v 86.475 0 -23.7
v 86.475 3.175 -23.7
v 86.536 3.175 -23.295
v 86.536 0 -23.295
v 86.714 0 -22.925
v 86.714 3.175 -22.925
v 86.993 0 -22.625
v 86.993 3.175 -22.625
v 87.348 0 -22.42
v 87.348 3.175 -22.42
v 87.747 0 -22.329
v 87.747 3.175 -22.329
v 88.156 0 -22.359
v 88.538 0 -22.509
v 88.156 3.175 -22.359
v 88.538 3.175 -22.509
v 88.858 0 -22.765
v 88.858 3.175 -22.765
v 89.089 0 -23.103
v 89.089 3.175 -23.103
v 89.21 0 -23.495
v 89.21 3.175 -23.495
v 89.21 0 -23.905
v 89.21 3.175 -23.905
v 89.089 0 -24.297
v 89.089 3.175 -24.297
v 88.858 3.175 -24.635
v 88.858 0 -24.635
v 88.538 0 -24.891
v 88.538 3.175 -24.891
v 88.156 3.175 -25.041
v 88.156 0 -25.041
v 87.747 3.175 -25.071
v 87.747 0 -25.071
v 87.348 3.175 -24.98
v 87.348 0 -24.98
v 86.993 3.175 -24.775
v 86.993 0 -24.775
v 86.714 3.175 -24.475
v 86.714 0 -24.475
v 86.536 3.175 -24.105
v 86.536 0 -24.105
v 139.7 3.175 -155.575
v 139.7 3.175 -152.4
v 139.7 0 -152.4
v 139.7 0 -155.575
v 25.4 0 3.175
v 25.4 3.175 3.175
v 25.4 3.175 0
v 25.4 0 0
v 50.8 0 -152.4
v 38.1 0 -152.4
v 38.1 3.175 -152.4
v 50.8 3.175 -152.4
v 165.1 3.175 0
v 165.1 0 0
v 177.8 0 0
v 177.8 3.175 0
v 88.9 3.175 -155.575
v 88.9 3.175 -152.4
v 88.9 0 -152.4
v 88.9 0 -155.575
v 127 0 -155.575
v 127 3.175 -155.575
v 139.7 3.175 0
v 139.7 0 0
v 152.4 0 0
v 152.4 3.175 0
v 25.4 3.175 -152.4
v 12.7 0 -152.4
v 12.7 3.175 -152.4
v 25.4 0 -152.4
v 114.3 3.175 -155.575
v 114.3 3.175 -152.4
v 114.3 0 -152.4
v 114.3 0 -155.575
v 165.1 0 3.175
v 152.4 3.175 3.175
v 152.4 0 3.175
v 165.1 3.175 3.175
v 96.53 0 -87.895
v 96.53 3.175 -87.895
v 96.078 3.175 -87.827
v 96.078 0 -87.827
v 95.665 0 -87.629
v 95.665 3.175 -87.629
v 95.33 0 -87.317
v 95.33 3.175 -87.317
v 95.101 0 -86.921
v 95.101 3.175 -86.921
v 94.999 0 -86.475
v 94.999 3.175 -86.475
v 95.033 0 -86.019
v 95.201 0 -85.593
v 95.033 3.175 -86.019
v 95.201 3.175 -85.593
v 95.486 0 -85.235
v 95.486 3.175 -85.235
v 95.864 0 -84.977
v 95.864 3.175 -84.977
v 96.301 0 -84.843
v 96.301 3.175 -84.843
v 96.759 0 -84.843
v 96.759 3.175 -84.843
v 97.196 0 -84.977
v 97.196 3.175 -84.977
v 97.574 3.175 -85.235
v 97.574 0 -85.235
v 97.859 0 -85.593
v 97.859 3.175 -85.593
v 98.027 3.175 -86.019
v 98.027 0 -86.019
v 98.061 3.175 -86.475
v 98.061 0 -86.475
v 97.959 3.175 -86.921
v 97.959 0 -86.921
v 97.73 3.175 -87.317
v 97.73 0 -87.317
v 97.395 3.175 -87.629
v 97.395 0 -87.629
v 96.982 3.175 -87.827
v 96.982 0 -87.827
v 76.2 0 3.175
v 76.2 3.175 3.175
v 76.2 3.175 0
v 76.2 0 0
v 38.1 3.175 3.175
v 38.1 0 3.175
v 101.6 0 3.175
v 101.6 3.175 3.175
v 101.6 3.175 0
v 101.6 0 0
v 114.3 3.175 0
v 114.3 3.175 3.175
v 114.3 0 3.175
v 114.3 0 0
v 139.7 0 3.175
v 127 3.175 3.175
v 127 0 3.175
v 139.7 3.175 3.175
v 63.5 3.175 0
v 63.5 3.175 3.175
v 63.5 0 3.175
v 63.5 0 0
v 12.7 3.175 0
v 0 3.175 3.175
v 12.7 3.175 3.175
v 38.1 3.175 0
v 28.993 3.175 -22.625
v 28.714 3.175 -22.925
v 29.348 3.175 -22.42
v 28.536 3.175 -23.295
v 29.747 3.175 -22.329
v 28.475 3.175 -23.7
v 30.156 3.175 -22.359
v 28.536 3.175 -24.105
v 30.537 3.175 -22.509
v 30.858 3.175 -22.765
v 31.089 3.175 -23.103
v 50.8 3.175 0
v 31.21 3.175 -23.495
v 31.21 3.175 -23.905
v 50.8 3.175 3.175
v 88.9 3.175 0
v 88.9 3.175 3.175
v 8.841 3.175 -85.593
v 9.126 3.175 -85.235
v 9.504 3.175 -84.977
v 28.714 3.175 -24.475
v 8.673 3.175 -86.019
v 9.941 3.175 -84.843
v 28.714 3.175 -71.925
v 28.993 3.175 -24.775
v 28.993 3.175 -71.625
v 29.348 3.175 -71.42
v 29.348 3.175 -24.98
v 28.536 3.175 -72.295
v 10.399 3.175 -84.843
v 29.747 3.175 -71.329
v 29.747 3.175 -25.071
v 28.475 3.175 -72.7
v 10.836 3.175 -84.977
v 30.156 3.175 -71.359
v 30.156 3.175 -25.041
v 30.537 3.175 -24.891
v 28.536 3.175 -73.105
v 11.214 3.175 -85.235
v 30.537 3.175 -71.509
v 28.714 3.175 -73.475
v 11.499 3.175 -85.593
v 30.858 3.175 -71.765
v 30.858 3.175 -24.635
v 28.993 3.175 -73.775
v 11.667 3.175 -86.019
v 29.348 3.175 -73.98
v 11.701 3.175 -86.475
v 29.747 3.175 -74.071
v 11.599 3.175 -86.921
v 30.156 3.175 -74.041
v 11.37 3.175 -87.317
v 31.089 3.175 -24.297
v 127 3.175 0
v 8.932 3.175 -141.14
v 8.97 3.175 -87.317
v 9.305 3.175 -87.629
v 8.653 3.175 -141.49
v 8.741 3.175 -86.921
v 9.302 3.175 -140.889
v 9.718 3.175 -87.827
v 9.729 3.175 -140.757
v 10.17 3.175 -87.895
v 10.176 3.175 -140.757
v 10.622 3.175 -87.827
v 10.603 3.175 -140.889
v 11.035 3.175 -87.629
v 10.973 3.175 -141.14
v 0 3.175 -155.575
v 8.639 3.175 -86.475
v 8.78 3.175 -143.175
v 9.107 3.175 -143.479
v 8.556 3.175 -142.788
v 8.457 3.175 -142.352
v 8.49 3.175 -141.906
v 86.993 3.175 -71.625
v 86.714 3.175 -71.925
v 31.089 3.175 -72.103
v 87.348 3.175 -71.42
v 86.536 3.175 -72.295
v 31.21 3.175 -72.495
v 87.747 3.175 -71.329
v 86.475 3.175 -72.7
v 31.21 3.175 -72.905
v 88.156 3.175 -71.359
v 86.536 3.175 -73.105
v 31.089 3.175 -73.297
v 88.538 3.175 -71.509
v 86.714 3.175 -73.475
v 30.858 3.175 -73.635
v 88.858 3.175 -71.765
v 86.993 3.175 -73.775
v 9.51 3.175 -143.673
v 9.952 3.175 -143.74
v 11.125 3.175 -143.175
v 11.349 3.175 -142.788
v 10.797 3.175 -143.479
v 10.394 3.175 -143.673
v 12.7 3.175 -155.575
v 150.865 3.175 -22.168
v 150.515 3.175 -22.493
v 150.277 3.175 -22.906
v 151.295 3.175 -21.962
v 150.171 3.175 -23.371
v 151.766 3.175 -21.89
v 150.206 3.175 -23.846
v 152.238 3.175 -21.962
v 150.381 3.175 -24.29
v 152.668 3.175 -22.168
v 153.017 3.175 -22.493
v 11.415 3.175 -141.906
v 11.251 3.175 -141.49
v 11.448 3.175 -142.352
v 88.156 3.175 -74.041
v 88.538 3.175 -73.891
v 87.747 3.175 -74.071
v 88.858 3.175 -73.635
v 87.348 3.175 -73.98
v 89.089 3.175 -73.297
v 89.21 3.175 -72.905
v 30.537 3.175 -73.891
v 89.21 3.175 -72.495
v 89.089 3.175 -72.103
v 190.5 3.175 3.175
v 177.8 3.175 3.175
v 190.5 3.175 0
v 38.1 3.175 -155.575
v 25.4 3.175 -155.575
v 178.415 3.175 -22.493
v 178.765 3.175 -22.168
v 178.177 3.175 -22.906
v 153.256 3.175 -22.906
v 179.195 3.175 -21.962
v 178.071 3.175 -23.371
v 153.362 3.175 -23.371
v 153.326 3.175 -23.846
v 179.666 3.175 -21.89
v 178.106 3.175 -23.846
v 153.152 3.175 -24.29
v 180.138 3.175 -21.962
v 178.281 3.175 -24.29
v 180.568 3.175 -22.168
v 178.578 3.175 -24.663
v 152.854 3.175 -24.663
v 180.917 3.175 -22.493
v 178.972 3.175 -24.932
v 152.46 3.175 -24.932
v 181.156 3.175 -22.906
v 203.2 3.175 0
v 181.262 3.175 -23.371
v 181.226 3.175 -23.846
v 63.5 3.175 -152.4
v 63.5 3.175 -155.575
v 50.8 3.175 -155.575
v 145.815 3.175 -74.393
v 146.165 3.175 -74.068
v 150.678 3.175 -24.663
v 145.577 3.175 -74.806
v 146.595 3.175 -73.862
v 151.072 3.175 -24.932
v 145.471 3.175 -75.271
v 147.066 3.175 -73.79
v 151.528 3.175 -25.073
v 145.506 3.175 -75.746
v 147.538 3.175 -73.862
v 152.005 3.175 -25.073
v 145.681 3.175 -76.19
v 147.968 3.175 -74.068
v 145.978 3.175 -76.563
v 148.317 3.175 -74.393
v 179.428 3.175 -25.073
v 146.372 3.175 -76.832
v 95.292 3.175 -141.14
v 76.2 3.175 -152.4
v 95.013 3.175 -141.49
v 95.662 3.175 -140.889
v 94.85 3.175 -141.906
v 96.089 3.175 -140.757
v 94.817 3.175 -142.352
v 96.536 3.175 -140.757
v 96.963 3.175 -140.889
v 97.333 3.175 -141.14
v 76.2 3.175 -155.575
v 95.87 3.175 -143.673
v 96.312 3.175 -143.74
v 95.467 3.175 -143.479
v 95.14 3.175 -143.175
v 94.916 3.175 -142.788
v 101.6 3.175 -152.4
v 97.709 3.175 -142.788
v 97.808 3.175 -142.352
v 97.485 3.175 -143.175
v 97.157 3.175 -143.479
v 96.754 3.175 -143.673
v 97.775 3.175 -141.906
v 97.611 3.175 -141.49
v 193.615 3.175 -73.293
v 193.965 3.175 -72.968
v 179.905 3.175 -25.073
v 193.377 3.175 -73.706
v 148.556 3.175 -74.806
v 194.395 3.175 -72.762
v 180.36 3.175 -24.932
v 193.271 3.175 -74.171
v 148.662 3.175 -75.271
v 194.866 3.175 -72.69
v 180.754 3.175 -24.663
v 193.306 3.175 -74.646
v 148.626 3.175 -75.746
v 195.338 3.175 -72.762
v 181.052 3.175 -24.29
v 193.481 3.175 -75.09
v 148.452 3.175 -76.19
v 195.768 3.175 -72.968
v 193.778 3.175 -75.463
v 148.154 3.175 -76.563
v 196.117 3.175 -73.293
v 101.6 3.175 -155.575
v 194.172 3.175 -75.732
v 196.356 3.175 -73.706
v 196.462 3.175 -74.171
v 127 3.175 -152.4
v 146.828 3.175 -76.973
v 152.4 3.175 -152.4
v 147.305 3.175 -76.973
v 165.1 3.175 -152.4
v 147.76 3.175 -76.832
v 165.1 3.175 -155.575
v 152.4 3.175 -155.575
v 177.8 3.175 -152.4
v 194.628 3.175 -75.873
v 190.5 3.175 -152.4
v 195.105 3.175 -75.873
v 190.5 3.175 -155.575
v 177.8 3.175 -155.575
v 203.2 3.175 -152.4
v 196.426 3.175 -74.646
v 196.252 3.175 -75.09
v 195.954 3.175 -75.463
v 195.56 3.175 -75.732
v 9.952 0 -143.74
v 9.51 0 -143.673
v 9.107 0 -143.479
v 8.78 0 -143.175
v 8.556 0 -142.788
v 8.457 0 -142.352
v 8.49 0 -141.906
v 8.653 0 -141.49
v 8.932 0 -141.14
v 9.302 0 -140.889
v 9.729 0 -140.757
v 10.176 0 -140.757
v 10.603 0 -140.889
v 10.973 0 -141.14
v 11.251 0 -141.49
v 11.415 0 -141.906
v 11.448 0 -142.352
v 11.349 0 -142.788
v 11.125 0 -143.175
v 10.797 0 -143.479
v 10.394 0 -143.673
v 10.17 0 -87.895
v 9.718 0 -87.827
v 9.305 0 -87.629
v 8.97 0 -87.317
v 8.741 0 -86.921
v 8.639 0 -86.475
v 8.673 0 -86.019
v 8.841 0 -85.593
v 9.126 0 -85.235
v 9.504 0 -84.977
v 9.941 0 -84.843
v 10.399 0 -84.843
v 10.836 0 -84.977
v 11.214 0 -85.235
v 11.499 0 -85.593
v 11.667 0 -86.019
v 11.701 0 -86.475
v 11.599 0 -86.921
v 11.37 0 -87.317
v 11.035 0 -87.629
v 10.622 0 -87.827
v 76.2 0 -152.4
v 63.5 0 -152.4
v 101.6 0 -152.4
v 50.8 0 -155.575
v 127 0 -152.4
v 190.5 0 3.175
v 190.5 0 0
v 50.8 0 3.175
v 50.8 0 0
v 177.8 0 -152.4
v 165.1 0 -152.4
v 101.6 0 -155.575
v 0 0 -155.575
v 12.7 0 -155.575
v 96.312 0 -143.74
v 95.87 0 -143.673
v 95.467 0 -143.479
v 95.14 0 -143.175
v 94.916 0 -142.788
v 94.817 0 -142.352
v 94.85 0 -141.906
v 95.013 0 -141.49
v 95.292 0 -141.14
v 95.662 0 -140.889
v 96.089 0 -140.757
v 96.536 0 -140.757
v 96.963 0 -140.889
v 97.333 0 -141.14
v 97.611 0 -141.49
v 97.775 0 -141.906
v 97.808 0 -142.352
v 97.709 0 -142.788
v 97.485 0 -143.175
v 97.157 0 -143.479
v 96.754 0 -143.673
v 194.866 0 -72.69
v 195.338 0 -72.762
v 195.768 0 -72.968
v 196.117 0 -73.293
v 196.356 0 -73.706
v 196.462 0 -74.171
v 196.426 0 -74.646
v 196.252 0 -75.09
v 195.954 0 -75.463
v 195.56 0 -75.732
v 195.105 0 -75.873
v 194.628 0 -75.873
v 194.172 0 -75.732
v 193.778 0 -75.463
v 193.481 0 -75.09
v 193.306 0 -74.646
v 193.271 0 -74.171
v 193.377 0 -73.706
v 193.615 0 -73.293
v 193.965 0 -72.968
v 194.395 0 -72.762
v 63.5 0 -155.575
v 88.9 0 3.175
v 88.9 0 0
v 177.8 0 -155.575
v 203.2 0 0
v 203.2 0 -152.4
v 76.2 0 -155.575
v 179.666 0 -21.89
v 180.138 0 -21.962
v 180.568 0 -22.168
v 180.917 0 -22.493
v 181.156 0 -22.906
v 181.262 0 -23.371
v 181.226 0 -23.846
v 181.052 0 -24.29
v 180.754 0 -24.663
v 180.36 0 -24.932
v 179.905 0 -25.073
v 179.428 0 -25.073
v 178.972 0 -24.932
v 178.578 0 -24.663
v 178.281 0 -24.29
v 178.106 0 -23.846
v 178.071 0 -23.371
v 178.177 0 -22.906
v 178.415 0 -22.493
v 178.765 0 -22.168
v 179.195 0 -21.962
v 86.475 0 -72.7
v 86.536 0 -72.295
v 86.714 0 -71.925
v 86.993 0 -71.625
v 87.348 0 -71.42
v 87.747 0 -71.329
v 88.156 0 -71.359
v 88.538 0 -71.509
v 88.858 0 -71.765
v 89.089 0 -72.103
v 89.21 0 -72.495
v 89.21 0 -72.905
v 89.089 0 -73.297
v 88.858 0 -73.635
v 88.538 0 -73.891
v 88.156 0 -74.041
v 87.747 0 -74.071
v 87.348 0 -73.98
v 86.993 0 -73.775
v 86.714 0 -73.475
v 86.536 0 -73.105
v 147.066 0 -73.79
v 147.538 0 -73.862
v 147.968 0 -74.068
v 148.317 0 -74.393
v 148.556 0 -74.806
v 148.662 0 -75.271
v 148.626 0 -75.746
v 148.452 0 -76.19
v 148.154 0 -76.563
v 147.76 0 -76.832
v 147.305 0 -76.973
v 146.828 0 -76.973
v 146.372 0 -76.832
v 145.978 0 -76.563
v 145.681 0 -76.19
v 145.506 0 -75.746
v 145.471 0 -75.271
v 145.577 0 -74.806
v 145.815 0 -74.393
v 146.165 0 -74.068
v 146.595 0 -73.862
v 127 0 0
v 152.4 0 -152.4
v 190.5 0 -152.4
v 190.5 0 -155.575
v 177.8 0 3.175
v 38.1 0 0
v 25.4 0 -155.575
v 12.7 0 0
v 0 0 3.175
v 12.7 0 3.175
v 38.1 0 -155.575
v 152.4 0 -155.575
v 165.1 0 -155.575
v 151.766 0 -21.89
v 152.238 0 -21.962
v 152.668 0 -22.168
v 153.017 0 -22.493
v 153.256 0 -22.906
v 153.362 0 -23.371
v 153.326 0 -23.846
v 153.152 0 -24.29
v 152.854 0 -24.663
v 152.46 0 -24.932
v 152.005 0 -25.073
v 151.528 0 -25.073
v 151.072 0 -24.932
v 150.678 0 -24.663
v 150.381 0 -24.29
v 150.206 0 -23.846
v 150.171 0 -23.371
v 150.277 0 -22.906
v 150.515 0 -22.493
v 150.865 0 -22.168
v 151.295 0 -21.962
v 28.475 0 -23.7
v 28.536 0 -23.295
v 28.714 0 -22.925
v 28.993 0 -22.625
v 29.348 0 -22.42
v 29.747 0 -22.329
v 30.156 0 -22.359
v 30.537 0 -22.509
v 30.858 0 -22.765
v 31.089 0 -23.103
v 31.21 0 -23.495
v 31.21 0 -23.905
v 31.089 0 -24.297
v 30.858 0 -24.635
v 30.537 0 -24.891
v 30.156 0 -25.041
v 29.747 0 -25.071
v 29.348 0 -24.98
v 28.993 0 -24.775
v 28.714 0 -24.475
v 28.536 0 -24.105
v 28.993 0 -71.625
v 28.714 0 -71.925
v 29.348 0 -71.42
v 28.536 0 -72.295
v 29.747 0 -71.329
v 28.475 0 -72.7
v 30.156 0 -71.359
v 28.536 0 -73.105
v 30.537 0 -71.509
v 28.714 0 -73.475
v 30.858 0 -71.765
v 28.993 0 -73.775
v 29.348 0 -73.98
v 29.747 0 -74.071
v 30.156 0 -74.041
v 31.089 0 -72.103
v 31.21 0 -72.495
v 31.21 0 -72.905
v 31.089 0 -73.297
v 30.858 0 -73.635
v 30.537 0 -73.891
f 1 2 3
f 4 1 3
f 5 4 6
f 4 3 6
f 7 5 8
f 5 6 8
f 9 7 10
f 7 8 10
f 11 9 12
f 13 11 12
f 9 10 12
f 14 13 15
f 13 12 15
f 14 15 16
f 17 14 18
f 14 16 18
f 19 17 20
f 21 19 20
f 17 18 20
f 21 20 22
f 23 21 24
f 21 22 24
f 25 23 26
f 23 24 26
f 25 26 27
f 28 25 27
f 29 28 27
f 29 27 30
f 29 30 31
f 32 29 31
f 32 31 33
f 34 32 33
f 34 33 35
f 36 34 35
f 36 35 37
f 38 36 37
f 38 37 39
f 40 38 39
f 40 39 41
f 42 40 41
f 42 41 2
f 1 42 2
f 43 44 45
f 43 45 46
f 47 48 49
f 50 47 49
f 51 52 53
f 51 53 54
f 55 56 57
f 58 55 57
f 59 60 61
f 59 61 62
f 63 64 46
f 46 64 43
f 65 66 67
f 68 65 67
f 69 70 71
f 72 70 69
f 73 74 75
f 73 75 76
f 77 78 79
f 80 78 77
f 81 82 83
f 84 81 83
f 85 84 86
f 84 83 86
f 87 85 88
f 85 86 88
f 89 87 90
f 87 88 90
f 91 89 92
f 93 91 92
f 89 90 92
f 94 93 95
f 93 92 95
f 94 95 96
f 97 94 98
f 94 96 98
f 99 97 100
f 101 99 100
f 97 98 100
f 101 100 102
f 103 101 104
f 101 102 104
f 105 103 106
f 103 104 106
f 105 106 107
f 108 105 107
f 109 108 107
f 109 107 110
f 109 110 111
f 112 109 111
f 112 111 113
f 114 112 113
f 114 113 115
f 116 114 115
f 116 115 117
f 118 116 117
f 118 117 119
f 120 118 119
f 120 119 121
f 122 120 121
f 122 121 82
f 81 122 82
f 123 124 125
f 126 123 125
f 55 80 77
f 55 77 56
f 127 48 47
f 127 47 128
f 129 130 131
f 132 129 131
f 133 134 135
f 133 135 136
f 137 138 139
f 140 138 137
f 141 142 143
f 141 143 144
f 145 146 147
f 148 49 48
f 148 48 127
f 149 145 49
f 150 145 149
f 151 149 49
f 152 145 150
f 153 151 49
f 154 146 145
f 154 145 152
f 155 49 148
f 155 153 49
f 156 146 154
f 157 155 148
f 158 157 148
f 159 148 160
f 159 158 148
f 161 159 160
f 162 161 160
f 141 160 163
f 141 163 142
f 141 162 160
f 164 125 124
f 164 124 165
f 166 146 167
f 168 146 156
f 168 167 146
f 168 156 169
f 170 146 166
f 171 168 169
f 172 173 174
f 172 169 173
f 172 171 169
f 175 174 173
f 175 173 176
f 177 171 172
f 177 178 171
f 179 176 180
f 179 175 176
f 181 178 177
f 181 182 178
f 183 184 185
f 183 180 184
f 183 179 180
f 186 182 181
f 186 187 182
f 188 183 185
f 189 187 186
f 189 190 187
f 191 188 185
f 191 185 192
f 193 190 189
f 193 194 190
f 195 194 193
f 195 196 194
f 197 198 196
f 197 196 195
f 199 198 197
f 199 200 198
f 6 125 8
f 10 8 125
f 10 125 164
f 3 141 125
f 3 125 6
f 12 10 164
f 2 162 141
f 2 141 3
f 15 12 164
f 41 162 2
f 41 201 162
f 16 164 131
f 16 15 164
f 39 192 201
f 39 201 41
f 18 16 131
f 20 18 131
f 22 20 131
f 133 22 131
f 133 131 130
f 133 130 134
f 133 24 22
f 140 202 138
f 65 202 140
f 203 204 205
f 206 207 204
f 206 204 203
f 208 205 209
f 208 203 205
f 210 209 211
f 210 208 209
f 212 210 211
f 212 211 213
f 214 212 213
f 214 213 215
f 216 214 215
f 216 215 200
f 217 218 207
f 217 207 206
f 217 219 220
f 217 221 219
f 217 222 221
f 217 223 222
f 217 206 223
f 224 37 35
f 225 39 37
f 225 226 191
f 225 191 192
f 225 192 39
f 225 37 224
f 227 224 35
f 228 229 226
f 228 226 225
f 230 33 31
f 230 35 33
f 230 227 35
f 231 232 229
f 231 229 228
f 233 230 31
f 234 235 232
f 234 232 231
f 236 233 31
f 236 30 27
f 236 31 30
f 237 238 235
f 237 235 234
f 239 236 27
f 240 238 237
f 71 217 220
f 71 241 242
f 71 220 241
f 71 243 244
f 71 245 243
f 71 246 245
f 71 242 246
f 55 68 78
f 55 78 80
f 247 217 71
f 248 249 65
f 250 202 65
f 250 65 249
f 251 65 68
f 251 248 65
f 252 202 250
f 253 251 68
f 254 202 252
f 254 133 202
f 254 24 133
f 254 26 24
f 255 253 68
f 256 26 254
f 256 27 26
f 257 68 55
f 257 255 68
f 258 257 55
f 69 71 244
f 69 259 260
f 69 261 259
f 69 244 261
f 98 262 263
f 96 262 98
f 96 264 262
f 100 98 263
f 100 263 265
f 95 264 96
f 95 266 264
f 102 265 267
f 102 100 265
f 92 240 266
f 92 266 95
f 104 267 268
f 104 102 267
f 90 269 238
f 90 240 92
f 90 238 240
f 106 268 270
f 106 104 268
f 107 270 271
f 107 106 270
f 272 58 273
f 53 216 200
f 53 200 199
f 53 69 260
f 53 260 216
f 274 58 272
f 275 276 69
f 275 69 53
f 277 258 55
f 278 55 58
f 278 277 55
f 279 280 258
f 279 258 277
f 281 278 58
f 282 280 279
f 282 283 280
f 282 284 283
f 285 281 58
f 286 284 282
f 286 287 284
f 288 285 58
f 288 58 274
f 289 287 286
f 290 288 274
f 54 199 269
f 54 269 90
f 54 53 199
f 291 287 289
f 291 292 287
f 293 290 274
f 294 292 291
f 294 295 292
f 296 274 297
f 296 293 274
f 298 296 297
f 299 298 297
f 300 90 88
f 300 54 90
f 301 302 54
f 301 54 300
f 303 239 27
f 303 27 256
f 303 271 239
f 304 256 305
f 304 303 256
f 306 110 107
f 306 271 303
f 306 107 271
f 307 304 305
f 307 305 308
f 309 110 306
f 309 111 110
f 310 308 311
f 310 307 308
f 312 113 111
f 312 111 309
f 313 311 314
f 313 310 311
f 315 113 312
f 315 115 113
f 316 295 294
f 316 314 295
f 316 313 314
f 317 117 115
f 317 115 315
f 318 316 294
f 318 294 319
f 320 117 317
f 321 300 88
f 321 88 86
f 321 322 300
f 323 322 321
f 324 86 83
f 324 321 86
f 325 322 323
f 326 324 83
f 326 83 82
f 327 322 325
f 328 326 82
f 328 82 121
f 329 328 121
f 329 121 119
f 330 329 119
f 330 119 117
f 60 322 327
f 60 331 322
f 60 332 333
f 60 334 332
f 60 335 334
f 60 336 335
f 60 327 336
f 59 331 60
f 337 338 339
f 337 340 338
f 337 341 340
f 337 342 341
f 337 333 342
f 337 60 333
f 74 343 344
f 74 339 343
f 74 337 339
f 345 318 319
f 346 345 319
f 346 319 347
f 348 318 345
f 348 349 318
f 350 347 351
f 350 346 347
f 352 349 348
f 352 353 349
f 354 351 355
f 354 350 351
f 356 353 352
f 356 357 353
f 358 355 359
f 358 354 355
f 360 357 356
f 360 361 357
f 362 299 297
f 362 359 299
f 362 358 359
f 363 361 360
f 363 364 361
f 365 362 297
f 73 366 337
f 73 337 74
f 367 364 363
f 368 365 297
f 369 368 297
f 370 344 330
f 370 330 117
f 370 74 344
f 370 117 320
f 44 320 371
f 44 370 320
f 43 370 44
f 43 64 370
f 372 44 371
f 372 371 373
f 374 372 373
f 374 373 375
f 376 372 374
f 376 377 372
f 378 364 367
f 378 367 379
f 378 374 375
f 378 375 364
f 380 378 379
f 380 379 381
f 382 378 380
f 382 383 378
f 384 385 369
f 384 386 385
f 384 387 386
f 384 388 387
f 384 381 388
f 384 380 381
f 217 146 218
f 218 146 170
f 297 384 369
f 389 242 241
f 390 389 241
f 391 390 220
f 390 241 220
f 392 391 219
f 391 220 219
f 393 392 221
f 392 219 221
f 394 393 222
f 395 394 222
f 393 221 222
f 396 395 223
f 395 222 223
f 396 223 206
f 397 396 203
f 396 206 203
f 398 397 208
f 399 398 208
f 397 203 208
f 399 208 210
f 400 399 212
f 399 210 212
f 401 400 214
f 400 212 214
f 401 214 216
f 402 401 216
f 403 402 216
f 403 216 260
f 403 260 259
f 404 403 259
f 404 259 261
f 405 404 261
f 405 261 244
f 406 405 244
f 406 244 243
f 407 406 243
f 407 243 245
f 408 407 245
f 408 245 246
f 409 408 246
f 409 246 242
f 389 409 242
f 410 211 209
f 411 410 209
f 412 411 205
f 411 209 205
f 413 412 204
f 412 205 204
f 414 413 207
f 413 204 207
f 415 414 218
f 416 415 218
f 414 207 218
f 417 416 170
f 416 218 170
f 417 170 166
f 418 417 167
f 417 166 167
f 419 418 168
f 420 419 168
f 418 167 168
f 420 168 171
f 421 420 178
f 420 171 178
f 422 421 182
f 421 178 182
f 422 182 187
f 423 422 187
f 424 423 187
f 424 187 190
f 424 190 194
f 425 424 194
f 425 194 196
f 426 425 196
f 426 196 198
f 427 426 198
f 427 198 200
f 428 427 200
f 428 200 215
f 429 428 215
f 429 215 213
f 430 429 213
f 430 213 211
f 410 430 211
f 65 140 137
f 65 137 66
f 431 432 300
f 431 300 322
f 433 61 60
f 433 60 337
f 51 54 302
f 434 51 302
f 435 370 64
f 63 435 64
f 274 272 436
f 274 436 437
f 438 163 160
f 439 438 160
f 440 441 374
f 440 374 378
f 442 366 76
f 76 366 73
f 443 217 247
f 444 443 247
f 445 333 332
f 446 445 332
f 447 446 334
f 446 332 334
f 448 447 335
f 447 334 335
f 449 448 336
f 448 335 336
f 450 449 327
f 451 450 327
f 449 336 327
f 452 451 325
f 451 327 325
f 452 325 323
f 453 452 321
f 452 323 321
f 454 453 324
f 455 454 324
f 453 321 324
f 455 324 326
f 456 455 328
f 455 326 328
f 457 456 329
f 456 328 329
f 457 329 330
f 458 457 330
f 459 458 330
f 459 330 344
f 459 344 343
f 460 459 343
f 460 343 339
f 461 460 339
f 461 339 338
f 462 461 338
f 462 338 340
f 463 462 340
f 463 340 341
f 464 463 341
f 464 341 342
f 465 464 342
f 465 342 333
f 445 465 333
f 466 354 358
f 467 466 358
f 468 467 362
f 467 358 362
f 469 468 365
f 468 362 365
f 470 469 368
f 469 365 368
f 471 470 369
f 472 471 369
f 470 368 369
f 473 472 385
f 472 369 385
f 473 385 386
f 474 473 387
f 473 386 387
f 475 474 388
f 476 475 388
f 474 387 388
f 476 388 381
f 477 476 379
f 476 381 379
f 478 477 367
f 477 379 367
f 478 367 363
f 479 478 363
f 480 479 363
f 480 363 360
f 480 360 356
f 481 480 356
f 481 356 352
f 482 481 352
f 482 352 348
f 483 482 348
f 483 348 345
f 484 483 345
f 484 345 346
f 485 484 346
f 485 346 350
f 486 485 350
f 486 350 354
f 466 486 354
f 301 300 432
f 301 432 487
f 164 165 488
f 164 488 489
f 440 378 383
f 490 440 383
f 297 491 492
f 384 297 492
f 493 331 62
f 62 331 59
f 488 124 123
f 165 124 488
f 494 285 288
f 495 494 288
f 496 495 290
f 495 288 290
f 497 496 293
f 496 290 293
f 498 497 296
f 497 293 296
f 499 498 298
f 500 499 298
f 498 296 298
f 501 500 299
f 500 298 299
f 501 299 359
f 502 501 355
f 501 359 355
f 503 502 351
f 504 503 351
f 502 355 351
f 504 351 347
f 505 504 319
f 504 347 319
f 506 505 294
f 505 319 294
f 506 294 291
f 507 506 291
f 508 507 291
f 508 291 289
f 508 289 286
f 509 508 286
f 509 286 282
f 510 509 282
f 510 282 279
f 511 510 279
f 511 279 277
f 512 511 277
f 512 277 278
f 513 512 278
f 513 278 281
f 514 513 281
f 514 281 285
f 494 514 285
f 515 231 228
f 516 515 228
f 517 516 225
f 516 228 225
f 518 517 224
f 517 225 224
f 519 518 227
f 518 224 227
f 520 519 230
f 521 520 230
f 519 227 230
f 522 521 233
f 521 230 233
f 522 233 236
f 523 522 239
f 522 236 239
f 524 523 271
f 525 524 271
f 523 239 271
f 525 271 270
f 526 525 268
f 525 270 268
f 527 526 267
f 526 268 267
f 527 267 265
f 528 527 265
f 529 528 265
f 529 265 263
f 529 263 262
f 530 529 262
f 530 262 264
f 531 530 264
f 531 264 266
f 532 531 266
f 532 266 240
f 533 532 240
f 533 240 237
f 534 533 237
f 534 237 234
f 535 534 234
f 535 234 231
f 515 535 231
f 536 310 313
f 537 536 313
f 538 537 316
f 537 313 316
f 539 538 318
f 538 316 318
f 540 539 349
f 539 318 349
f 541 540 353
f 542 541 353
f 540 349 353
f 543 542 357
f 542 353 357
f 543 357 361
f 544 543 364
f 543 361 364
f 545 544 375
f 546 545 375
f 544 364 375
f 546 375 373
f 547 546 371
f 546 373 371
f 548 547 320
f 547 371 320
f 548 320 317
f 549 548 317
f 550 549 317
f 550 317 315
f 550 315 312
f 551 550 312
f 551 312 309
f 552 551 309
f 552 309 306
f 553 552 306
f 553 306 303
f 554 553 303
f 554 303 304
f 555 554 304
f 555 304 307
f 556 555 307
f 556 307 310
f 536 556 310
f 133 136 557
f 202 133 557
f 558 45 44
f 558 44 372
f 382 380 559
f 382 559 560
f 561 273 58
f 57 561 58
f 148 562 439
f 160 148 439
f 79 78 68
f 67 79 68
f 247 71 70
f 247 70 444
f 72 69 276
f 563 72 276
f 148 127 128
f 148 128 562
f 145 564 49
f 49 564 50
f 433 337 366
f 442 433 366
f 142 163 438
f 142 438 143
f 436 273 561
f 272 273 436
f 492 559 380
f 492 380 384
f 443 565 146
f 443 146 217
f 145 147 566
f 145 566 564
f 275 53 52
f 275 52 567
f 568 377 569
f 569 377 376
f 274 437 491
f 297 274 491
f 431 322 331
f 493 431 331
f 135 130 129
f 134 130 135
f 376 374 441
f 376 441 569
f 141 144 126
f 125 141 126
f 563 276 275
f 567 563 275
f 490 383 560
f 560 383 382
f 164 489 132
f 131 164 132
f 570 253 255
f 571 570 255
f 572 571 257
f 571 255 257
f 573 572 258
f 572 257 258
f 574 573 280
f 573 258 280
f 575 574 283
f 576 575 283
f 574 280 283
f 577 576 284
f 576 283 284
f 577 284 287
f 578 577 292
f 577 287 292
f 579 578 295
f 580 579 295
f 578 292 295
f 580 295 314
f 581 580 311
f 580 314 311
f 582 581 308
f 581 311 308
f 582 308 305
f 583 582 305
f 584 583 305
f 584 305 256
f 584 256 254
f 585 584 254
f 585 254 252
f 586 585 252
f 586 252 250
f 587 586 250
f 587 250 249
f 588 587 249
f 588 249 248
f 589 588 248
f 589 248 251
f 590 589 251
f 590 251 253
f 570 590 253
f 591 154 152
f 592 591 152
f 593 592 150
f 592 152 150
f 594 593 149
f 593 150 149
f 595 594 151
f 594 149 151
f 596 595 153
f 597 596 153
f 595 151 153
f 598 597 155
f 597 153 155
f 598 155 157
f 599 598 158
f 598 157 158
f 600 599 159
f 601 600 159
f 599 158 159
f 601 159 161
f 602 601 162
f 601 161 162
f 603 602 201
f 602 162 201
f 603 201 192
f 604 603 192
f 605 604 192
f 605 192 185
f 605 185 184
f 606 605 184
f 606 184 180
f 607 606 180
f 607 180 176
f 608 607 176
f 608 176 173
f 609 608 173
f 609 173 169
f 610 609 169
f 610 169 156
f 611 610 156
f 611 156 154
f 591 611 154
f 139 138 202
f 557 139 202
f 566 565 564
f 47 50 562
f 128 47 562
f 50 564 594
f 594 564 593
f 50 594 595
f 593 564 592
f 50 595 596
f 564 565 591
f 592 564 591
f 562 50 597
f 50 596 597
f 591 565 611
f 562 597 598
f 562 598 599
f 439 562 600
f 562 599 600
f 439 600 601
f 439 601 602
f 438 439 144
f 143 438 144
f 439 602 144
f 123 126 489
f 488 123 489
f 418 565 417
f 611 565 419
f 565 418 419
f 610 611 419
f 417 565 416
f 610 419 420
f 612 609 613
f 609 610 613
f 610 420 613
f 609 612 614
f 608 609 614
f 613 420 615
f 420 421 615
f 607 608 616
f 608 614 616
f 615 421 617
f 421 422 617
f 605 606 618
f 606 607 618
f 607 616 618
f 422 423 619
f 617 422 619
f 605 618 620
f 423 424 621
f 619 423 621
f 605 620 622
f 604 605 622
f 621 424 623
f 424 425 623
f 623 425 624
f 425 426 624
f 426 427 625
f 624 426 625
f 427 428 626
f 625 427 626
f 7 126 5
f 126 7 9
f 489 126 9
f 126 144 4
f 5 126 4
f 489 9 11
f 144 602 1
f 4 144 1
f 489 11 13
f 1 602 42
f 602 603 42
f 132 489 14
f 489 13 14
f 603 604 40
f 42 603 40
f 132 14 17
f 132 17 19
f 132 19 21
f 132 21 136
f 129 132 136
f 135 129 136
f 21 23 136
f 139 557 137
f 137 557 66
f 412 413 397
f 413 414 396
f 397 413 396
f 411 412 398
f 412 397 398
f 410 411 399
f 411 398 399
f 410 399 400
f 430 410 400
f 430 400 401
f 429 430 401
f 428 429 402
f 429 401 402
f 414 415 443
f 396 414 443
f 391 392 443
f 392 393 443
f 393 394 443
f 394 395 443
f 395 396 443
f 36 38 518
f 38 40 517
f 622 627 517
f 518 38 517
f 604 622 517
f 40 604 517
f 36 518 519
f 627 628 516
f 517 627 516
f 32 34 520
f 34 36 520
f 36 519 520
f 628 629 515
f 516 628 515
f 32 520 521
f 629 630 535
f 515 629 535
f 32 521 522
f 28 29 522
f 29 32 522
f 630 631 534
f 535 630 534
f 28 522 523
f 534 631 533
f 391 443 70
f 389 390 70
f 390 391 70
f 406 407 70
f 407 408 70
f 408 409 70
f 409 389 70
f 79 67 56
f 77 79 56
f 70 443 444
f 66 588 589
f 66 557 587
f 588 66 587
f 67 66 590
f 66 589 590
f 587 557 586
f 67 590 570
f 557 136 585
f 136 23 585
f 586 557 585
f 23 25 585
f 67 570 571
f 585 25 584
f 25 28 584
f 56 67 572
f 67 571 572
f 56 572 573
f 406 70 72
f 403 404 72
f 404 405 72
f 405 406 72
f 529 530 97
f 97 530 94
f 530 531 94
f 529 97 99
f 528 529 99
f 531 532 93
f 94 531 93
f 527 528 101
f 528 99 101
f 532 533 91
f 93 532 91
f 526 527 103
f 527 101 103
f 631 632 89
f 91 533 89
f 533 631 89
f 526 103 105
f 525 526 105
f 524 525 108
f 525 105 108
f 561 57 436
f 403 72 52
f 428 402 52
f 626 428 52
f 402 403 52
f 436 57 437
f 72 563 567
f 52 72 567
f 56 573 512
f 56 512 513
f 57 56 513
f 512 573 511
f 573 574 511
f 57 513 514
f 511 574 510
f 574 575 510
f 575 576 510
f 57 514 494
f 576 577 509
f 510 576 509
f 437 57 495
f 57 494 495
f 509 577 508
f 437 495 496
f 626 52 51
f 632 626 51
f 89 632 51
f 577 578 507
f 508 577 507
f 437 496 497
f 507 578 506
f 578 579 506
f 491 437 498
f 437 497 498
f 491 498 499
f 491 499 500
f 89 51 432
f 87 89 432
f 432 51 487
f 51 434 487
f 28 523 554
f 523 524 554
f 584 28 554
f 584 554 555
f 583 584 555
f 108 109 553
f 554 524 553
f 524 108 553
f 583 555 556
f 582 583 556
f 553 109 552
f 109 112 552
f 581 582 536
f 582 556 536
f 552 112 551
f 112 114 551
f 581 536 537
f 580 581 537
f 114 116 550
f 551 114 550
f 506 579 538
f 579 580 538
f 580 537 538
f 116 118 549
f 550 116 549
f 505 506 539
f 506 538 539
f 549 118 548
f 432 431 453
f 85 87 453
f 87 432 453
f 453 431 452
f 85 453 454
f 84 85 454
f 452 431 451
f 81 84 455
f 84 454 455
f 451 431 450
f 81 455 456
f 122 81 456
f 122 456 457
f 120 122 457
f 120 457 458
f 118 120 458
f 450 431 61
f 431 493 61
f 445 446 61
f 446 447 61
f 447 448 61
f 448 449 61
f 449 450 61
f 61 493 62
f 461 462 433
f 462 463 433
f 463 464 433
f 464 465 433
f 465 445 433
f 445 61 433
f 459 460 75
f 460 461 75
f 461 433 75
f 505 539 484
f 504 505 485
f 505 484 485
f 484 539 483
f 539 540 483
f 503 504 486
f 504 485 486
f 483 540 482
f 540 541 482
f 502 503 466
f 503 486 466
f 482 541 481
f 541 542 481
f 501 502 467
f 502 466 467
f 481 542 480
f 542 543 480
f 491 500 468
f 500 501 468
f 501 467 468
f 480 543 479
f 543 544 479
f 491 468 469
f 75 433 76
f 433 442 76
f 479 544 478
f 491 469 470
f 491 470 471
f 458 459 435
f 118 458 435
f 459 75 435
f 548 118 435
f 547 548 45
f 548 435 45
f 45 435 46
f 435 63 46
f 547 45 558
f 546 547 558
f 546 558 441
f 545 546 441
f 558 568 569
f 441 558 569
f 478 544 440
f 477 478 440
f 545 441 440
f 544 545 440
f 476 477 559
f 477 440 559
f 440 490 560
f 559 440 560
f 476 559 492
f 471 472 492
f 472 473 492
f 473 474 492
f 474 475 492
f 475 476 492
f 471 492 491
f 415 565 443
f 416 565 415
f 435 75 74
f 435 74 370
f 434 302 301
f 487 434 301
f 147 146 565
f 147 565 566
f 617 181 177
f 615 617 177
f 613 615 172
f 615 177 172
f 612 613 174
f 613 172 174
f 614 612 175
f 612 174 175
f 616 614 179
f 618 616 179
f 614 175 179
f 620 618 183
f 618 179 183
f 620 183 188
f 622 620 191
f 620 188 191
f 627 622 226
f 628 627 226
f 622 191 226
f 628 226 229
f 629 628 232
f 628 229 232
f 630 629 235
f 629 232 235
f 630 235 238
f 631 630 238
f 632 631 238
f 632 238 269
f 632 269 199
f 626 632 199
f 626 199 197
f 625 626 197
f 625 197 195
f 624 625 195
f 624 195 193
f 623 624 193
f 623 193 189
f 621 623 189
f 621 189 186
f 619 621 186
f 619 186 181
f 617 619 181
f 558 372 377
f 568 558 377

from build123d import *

# Parameters (mm, degrees)
SKETCH1_W              = 203.2
SKETCH1_H              = 152.4
BOSS_EXTRUDE1_DEPTH    = 3.175
SKETCH2_W              = 12.7
SKETCH2_H              = 3.175
BOSS_EXTRUDE2_DEPTH    = 3.175
BOSS_EXTRUDE2_2_DEPTH  = 3.175
BOSS_EXTRUDE2_3_DEPTH  = 3.175
BOSS_EXTRUDE2_4_DEPTH  = 3.175
BOSS_EXTRUDE2_5_DEPTH  = 3.175
BOSS_EXTRUDE2_6_DEPTH  = 3.175
BOSS_EXTRUDE2_7_DEPTH  = 3.175
BOSS_EXTRUDE2_8_DEPTH  = 3.175
BOSS_EXTRUDE2_9_DEPTH  = 3.175
BOSS_EXTRUDE2_10_DEPTH = 3.175
BOSS_EXTRUDE2_11_DEPTH = 3.175
BOSS_EXTRUDE2_12_DEPTH = 3.175
BOSS_EXTRUDE2_13_DEPTH = 3.175
BOSS_EXTRUDE2_14_DEPTH = 3.175
BOSS_EXTRUDE2_15_DEPTH = 3.175
BOSS_EXTRUDE2_16_DEPTH = 3.175
SKETCH4_R              = 1.375
RASPI_DEPTH            = 4.175
SKETCH5_R              = 1.6
ARDUINO_DEPTH          = 4.175
SKETCH10_R             = 1.535
SKETCH10_R_2           = 1.5
PERFBOARD_DEPTH        = 1
PERFBOARD_DEPTH_BACK   = 4.175


with BuildPart() as part:
    # Sketch1 → Boss-Extrude1 (new body)
    with BuildSketch(Plane(origin=(0, 0, 0), x_dir=(1, 0, 0), z_dir=(0, 1, 0))):
        with Locations((101.6, 76.2)):
            Rectangle(SKETCH1_W, SKETCH1_H)
    extrude(amount=BOSS_EXTRUDE1_DEPTH)

    # Sketch4 → Raspi (cut, through all)
    with BuildSketch(Plane(origin=(163.318517222, 3.175, 18.128898402), x_dir=(-1, 0, 0), z_dir=(0, 1, 0))):
        with Locations((75.468517222, -41.828898402)):
            Circle(SKETCH4_R)
        with Locations((75.468517222, -90.828898402)):
            Circle(SKETCH4_R)
        with Locations((133.468517222, -90.828898402)):
            Circle(SKETCH4_R)
        with Locations((133.468517222, -41.828898402)):
            Circle(SKETCH4_R)
    extrude(amount=-RASPI_DEPTH, mode=Mode.SUBTRACT)

    # Sketch5 → Arduino (cut, through all)
    with BuildSketch(Plane(origin=(-58.332709996, 3.175, -175.865858612), x_dir=(0, 0, 1), z_dir=(0, 1, 0))):
        with Locations((100.475405858, 205.398928035)):
            Circle(SKETCH5_R)
        with Locations((101.575405858, 253.198928035)):
            Circle(SKETCH5_R)
        with Locations((152.375405858, 210.098928035)):
            Circle(SKETCH5_R)
        with Locations((152.375405858, 237.998928035)):
            Circle(SKETCH5_R)
    extrude(amount=-ARDUINO_DEPTH, mode=Mode.SUBTRACT)

    # Sketch10 → Perfboard (cut, two sides)
    with BuildSketch(Plane(origin=(154.738240667, 3.175, -89.784200023), x_dir=(0, 0, -1), z_dir=(0, 1, 0))) as perfboard_sk:
        with Locations((-3.423776116, 144.568240667)):
            Circle(SKETCH10_R)
        with Locations((52.455799977, 144.785900219)):
            Circle(SKETCH10_R_2)
        with Locations((-3.423776116, 58.208240667)):
            Circle(SKETCH10_R)
        with Locations((52.455799977, 58.425900219)):
            Circle(SKETCH10_R_2)
    extrude(amount=PERFBOARD_DEPTH, mode=Mode.SUBTRACT)
    extrude(perfboard_sk.sketch, amount=-PERFBOARD_DEPTH_BACK, mode=Mode.SUBTRACT)


with BuildPart() as body_2:
    # Sketch2 → Boss-Extrude2 (new body)
    with BuildSketch(Plane(origin=(0, 3.175, 0), x_dir=(1, 0, 0), z_dir=(0, 1, 0))):
        with Locations((31.75, -1.5875)):
            Rectangle(SKETCH2_W, SKETCH2_H)
    extrude(amount=-BOSS_EXTRUDE2_DEPTH)


with BuildPart() as body_3:
    # Sketch2 → Boss-Extrude2 2 (new body)
    with BuildSketch(Plane(origin=(0, 3.175, 0), x_dir=(1, 0, 0), z_dir=(0, 1, 0))):
        with Locations((6.35, -1.5875)):
            Rectangle(SKETCH2_W, SKETCH2_H)
    extrude(amount=-BOSS_EXTRUDE2_2_DEPTH)


with BuildPart() as body_4:
    # Sketch2 → Boss-Extrude2 3 (new body)
    with BuildSketch(Plane(origin=(0, 3.175, 0), x_dir=(1, 0, 0), z_dir=(0, 1, 0))):
        with Locations((57.15, -1.5875)):
            Rectangle(SKETCH2_W, SKETCH2_H)
    extrude(amount=-BOSS_EXTRUDE2_3_DEPTH)


with BuildPart() as body_5:
    # Sketch2 → Boss-Extrude2 4 (new body)
    with BuildSketch(Plane(origin=(0, 3.175, 0), x_dir=(1, 0, 0), z_dir=(0, 1, 0))):
        with Locations((82.55, -1.5875)):
            Rectangle(SKETCH2_W, SKETCH2_H)
    extrude(amount=-BOSS_EXTRUDE2_4_DEPTH)


with BuildPart() as body_6:
    # Sketch2 → Boss-Extrude2 5 (new body)
    with BuildSketch(Plane(origin=(0, 3.175, 0), x_dir=(1, 0, 0), z_dir=(0, 1, 0))):
        with Locations((107.95, -1.5875)):
            Rectangle(SKETCH2_W, SKETCH2_H)
    extrude(amount=-BOSS_EXTRUDE2_5_DEPTH)


with BuildPart() as body_7:
    # Sketch2 → Boss-Extrude2 6 (new body)
    with BuildSketch(Plane(origin=(0, 3.175, 0), x_dir=(1, 0, 0), z_dir=(0, 1, 0))):
        with Locations((133.35, -1.5875)):
            Rectangle(SKETCH2_W, SKETCH2_H)
    extrude(amount=-BOSS_EXTRUDE2_6_DEPTH)


with BuildPart() as body_8:
    # Sketch2 → Boss-Extrude2 7 (new body)
    with BuildSketch(Plane(origin=(0, 3.175, 0), x_dir=(1, 0, 0), z_dir=(0, 1, 0))):
        with Locations((158.75, -1.5875)):
            Rectangle(SKETCH2_W, SKETCH2_H)
    extrude(amount=-BOSS_EXTRUDE2_7_DEPTH)


with BuildPart() as body_9:
    # Sketch2 → Boss-Extrude2 8 (new body)
    with BuildSketch(Plane(origin=(0, 3.175, 0), x_dir=(1, 0, 0), z_dir=(0, 1, 0))):
        with Locations((184.15, -1.5875)):
            Rectangle(SKETCH2_W, SKETCH2_H)
    extrude(amount=-BOSS_EXTRUDE2_8_DEPTH)


with BuildPart() as body_10:
    # Sketch2 → Boss-Extrude2 9 (new body)
    with BuildSketch(Plane(origin=(0, 3.175, 0), x_dir=(1, 0, 0), z_dir=(0, 1, 0))):
        with Locations((184.15, 153.9875)):
            Rectangle(SKETCH2_W, SKETCH2_H)
    extrude(amount=-BOSS_EXTRUDE2_9_DEPTH)


with BuildPart() as body_11:
    # Sketch2 → Boss-Extrude2 10 (new body)
    with BuildSketch(Plane(origin=(0, 3.175, 0), x_dir=(1, 0, 0), z_dir=(0, 1, 0))):
        with Locations((158.75, 153.9875)):
            Rectangle(SKETCH2_W, SKETCH2_H)
    extrude(amount=-BOSS_EXTRUDE2_10_DEPTH)


with BuildPart() as body_12:
    # Sketch2 → Boss-Extrude2 11 (new body)
    with BuildSketch(Plane(origin=(0, 3.175, 0), x_dir=(1, 0, 0), z_dir=(0, 1, 0))):
        with Locations((133.35, 153.9875)):
            Rectangle(SKETCH2_W, SKETCH2_H)
    extrude(amount=-BOSS_EXTRUDE2_11_DEPTH)


with BuildPart() as body_13:
    # Sketch2 → Boss-Extrude2 12 (new body)
    with BuildSketch(Plane(origin=(0, 3.175, 0), x_dir=(1, 0, 0), z_dir=(0, 1, 0))):
        with Locations((107.95, 153.9875)):
            Rectangle(SKETCH2_W, SKETCH2_H)
    extrude(amount=-BOSS_EXTRUDE2_12_DEPTH)


with BuildPart() as body_14:
    # Sketch2 → Boss-Extrude2 13 (new body)
    with BuildSketch(Plane(origin=(0, 3.175, 0), x_dir=(1, 0, 0), z_dir=(0, 1, 0))):
        with Locations((82.55, 153.9875)):
            Rectangle(SKETCH2_W, SKETCH2_H)
    extrude(amount=-BOSS_EXTRUDE2_13_DEPTH)


with BuildPart() as body_15:
    # Sketch2 → Boss-Extrude2 14 (new body)
    with BuildSketch(Plane(origin=(0, 3.175, 0), x_dir=(1, 0, 0), z_dir=(0, 1, 0))):
        with Locations((57.15, 153.9875)):
            Rectangle(SKETCH2_W, SKETCH2_H)
    extrude(amount=-BOSS_EXTRUDE2_14_DEPTH)


with BuildPart() as body_16:
    # Sketch2 → Boss-Extrude2 15 (new body)
    with BuildSketch(Plane(origin=(0, 3.175, 0), x_dir=(1, 0, 0), z_dir=(0, 1, 0))):
        with Locations((31.75, 153.9875)):
            Rectangle(SKETCH2_W, SKETCH2_H)
    extrude(amount=-BOSS_EXTRUDE2_15_DEPTH)


with BuildPart() as body_17:
    # Sketch2 → Boss-Extrude2 16 (new body)
    with BuildSketch(Plane(origin=(0, 3.175, 0), x_dir=(1, 0, 0), z_dir=(0, 1, 0))):
        with Locations((6.35, 153.9875)):
            Rectangle(SKETCH2_W, SKETCH2_H)
    extrude(amount=-BOSS_EXTRUDE2_16_DEPTH)


with BuildPart() as body_3_1:
    add(body_3.part)

    # Combine1: union body 4, body 6, body 8, body 10, body 12, body 14, body 16, body 17, part, body 2, body 5, body 7, body 9, body 11, body 13, body 15
    add(body_4.part)
    add(body_6.part)
    add(body_8.part)
    add(body_10.part)
    add(body_12.part)
    add(body_14.part)
    add(body_16.part)
    add(body_17.part)
    add(part.part)
    add(body_2.part)
    add(body_5.part)
    add(body_7.part)
    add(body_9.part)
    add(body_11.part)
    add(body_13.part)
    add(body_15.part)


solid = body_3_1.part
